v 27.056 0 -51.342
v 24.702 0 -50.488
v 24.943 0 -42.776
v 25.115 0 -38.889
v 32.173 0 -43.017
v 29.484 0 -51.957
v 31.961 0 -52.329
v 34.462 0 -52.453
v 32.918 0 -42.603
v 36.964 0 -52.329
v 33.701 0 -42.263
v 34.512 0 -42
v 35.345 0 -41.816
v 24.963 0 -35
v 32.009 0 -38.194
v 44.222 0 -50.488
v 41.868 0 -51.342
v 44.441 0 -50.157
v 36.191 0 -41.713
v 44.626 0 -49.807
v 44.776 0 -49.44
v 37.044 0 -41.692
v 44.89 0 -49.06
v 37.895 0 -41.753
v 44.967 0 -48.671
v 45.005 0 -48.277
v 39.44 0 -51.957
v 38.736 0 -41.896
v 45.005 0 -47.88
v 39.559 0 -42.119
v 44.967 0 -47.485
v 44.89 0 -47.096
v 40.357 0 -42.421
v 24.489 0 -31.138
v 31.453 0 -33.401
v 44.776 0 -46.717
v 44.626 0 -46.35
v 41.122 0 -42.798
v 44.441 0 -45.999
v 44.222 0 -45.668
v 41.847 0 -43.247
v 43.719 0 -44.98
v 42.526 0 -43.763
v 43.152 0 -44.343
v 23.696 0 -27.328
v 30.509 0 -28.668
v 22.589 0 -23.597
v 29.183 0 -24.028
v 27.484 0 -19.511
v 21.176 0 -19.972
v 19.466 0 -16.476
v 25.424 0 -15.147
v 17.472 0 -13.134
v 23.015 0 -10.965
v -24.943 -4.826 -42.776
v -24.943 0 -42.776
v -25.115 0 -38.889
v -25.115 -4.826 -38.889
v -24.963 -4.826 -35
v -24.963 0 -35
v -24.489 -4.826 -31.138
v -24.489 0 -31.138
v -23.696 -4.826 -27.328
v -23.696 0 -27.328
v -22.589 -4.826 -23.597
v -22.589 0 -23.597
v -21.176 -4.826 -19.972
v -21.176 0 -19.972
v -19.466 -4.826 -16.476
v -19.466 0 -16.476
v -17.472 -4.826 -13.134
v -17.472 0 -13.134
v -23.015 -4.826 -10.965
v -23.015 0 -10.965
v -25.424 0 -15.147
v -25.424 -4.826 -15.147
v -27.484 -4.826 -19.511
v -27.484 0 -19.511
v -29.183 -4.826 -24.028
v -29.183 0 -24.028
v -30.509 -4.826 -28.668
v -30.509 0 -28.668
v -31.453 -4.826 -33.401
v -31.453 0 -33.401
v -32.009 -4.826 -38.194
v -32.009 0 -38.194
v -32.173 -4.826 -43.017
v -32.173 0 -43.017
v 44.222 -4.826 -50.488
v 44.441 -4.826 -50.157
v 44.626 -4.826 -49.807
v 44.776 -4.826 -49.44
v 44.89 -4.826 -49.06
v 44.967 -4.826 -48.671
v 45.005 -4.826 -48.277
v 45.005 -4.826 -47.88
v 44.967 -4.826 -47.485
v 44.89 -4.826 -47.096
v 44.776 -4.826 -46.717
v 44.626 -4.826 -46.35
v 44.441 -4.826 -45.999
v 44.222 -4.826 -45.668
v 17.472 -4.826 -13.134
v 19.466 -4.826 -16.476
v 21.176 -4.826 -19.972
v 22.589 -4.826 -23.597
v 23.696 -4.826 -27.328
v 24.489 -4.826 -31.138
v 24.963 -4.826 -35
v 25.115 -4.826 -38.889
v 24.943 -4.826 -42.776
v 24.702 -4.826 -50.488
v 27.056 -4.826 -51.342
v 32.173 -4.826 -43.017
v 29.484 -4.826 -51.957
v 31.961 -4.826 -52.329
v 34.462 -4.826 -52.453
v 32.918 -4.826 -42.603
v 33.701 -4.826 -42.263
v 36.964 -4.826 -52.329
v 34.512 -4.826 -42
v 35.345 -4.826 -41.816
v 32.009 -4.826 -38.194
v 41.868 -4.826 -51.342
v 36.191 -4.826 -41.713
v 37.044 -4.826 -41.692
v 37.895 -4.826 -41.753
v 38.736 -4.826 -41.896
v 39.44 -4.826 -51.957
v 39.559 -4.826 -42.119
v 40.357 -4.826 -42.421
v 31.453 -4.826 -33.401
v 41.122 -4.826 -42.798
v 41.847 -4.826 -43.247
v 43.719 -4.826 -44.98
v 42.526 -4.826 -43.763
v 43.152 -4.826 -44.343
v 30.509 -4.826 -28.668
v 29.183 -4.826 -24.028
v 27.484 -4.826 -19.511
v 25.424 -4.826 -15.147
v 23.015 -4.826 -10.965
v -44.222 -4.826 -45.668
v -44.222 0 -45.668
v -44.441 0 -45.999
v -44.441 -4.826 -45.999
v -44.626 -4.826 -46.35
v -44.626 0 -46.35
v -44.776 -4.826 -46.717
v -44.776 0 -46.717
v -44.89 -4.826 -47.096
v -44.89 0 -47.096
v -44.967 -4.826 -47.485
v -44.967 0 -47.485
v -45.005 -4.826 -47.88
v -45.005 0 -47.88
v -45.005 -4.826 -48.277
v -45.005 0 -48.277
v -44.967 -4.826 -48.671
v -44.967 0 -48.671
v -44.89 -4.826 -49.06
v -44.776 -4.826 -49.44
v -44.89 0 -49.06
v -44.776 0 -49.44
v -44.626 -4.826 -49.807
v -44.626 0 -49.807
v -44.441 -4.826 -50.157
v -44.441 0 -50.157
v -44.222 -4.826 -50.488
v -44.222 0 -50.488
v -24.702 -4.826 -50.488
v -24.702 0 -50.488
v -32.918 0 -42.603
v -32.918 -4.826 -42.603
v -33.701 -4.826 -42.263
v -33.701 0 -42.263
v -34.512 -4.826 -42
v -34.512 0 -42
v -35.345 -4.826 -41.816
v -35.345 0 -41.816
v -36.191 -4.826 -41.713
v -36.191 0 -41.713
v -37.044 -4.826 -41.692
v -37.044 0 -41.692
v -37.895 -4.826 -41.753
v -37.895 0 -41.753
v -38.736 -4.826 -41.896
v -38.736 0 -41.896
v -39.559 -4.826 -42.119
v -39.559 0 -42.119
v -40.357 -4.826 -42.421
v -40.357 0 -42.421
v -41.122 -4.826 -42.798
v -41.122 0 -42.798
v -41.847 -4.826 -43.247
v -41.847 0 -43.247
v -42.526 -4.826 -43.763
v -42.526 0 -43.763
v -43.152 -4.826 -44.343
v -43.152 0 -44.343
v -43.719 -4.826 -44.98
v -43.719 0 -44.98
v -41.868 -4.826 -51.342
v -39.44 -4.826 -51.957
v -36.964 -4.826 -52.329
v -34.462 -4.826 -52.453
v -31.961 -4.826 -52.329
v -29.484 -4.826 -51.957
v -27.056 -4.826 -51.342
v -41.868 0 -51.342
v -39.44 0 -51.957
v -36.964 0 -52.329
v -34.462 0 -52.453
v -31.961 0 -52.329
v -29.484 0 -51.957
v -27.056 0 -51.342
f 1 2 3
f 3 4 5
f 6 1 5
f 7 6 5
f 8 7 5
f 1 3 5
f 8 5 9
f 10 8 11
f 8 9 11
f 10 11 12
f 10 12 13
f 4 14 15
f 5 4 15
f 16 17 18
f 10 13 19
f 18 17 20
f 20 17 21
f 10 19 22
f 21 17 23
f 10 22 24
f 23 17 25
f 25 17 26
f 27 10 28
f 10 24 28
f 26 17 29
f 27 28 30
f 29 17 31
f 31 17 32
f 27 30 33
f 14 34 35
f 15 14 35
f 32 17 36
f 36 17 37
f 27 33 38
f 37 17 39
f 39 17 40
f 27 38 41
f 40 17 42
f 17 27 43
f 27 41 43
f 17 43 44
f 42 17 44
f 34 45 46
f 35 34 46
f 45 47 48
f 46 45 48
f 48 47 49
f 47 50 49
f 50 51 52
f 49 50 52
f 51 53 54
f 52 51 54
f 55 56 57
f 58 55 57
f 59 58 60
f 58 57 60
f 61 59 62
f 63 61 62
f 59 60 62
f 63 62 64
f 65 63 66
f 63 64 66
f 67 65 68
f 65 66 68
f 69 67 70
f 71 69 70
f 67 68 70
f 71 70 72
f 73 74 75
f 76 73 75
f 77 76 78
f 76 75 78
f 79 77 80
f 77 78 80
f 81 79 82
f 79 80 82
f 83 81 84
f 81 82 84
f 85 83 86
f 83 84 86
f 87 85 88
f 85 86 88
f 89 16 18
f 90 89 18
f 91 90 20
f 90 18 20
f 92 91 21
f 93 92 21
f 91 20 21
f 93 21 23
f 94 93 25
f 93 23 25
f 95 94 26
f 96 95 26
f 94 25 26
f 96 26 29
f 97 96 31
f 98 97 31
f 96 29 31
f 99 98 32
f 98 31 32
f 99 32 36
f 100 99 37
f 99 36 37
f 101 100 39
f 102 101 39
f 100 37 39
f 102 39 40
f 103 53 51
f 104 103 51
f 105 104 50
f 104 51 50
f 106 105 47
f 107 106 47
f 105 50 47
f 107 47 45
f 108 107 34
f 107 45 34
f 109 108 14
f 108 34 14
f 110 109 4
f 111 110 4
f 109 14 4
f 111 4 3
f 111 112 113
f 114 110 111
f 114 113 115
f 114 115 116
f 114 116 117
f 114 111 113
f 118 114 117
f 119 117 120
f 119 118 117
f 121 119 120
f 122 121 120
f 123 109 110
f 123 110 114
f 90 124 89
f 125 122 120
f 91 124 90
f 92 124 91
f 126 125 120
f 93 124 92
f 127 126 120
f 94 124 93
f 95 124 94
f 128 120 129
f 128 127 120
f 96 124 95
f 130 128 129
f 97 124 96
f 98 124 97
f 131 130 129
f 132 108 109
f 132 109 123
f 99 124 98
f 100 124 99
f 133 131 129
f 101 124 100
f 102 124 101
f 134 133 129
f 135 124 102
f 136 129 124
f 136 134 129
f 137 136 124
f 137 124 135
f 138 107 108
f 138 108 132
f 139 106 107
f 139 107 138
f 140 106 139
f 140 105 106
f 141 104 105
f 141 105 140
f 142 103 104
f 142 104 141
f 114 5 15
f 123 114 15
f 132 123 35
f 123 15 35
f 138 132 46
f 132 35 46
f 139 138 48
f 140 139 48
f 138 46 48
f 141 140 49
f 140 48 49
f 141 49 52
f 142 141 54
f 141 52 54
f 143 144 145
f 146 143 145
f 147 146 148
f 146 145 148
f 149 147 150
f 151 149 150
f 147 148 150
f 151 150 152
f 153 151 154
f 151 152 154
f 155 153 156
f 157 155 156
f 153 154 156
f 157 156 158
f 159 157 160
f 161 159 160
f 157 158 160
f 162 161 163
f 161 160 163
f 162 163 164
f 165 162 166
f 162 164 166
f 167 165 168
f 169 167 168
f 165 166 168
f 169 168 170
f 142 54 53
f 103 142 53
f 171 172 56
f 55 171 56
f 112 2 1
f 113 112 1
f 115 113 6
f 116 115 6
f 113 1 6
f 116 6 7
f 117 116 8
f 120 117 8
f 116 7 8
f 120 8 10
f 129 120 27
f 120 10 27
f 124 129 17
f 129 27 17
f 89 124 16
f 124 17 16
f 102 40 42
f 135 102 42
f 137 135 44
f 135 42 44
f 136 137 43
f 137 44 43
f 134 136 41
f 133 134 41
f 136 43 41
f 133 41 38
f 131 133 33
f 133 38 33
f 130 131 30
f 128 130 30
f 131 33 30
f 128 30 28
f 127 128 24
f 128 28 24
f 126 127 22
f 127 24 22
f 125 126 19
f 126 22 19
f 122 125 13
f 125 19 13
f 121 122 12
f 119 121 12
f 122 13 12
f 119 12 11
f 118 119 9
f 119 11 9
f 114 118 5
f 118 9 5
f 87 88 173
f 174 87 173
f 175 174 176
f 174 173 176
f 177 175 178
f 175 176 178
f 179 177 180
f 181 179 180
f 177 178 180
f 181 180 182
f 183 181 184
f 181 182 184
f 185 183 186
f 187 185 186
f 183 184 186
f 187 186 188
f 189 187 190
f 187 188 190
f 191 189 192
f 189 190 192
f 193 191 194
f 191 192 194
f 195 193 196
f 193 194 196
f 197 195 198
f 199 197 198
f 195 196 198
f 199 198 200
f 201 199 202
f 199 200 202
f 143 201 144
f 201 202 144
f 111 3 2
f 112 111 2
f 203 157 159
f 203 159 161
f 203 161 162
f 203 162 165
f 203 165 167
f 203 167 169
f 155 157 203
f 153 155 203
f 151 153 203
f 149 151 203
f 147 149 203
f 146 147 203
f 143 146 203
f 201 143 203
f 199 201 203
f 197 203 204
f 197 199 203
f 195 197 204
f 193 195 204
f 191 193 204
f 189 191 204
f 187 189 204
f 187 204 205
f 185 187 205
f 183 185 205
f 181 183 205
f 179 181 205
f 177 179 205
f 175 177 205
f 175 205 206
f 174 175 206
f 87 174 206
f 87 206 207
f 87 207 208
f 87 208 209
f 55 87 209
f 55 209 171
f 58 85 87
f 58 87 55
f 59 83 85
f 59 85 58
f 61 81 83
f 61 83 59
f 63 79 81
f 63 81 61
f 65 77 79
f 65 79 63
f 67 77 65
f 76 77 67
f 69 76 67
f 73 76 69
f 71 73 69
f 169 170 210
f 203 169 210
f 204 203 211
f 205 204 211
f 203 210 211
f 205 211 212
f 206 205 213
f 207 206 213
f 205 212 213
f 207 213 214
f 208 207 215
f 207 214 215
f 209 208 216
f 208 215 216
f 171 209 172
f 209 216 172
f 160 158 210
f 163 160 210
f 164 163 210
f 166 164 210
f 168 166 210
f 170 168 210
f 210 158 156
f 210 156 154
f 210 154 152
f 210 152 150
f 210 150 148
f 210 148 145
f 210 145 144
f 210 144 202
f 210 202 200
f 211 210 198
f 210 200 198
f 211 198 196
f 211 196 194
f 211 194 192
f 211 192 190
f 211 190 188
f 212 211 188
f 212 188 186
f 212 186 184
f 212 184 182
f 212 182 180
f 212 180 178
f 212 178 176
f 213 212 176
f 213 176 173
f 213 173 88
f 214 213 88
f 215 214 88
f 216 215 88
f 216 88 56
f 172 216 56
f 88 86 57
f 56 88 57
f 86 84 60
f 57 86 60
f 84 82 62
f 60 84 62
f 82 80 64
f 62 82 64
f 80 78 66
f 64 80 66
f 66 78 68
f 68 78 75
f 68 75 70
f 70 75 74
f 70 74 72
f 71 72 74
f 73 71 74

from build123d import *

# Parameters (mm, degrees)
F1_DEPTH = 4.826


with BuildPart() as f1:
    # F0 (on Front) → F1 (new body)
    with BuildSketch(Plane.XZ):
        with BuildLine():
            Line((24.942877, -42.776432), (32.172695, -43.017425))
            ThreePointArc((32.172695, -43.017425), (29.893309, -26.334326), (23.014925, -10.965226))
            Line((23.014925, -10.965226), (17.472062, -13.134172))
            ThreePointArc((17.472062, -13.134172), (23.695987, -27.328115), (24.942877, -42.776432))
        make_face()
        with BuildLine():
            ThreePointArc((44.2224, -45.66836), (38.73582, -41.896198), (32.172695, -43.017425))
            Line((32.172695, -43.017425), (24.942877, -42.776432))
            Line((24.942877, -42.776432), (24.701886, -50.488241))
            ThreePointArc((24.701886, -50.488241), (34.462143, -52.453352), (44.2224, -50.488241))
            ThreePointArc((44.2224, -50.488241), (45.009931, -48.0783), (44.2224, -45.66836))
        make_face()
        with BuildLine():
            ThreePointArc((-24.942877, -42.776432), (-23.695987, -27.328115), (-17.472062, -13.134172))
            Line((-17.472062, -13.134172), (-23.014925, -10.965226))
            ThreePointArc((-23.014925, -10.965226), (-29.893309, -26.334326), (-32.172695, -43.017425))
            Line((-32.172695, -43.017425), (-24.942877, -42.776432))
        make_face()
        with BuildLine():
            Line((-24.701886, -50.488241), (-24.942877, -42.776432))
            Line((-24.942877, -42.776432), (-32.172695, -43.017425))
            ThreePointArc((-32.172695, -43.017425), (-38.73582, -41.896198), (-44.2224, -45.66836))
            ThreePointArc((-44.2224, -45.66836), (-45.009931, -48.0783), (-44.2224, -50.488241))
            ThreePointArc((-44.2224, -50.488241), (-34.462143, -52.453352), (-24.701886, -50.488241))
        make_face()
    extrude(amount=F1_DEPTH)


solid = f1.part
